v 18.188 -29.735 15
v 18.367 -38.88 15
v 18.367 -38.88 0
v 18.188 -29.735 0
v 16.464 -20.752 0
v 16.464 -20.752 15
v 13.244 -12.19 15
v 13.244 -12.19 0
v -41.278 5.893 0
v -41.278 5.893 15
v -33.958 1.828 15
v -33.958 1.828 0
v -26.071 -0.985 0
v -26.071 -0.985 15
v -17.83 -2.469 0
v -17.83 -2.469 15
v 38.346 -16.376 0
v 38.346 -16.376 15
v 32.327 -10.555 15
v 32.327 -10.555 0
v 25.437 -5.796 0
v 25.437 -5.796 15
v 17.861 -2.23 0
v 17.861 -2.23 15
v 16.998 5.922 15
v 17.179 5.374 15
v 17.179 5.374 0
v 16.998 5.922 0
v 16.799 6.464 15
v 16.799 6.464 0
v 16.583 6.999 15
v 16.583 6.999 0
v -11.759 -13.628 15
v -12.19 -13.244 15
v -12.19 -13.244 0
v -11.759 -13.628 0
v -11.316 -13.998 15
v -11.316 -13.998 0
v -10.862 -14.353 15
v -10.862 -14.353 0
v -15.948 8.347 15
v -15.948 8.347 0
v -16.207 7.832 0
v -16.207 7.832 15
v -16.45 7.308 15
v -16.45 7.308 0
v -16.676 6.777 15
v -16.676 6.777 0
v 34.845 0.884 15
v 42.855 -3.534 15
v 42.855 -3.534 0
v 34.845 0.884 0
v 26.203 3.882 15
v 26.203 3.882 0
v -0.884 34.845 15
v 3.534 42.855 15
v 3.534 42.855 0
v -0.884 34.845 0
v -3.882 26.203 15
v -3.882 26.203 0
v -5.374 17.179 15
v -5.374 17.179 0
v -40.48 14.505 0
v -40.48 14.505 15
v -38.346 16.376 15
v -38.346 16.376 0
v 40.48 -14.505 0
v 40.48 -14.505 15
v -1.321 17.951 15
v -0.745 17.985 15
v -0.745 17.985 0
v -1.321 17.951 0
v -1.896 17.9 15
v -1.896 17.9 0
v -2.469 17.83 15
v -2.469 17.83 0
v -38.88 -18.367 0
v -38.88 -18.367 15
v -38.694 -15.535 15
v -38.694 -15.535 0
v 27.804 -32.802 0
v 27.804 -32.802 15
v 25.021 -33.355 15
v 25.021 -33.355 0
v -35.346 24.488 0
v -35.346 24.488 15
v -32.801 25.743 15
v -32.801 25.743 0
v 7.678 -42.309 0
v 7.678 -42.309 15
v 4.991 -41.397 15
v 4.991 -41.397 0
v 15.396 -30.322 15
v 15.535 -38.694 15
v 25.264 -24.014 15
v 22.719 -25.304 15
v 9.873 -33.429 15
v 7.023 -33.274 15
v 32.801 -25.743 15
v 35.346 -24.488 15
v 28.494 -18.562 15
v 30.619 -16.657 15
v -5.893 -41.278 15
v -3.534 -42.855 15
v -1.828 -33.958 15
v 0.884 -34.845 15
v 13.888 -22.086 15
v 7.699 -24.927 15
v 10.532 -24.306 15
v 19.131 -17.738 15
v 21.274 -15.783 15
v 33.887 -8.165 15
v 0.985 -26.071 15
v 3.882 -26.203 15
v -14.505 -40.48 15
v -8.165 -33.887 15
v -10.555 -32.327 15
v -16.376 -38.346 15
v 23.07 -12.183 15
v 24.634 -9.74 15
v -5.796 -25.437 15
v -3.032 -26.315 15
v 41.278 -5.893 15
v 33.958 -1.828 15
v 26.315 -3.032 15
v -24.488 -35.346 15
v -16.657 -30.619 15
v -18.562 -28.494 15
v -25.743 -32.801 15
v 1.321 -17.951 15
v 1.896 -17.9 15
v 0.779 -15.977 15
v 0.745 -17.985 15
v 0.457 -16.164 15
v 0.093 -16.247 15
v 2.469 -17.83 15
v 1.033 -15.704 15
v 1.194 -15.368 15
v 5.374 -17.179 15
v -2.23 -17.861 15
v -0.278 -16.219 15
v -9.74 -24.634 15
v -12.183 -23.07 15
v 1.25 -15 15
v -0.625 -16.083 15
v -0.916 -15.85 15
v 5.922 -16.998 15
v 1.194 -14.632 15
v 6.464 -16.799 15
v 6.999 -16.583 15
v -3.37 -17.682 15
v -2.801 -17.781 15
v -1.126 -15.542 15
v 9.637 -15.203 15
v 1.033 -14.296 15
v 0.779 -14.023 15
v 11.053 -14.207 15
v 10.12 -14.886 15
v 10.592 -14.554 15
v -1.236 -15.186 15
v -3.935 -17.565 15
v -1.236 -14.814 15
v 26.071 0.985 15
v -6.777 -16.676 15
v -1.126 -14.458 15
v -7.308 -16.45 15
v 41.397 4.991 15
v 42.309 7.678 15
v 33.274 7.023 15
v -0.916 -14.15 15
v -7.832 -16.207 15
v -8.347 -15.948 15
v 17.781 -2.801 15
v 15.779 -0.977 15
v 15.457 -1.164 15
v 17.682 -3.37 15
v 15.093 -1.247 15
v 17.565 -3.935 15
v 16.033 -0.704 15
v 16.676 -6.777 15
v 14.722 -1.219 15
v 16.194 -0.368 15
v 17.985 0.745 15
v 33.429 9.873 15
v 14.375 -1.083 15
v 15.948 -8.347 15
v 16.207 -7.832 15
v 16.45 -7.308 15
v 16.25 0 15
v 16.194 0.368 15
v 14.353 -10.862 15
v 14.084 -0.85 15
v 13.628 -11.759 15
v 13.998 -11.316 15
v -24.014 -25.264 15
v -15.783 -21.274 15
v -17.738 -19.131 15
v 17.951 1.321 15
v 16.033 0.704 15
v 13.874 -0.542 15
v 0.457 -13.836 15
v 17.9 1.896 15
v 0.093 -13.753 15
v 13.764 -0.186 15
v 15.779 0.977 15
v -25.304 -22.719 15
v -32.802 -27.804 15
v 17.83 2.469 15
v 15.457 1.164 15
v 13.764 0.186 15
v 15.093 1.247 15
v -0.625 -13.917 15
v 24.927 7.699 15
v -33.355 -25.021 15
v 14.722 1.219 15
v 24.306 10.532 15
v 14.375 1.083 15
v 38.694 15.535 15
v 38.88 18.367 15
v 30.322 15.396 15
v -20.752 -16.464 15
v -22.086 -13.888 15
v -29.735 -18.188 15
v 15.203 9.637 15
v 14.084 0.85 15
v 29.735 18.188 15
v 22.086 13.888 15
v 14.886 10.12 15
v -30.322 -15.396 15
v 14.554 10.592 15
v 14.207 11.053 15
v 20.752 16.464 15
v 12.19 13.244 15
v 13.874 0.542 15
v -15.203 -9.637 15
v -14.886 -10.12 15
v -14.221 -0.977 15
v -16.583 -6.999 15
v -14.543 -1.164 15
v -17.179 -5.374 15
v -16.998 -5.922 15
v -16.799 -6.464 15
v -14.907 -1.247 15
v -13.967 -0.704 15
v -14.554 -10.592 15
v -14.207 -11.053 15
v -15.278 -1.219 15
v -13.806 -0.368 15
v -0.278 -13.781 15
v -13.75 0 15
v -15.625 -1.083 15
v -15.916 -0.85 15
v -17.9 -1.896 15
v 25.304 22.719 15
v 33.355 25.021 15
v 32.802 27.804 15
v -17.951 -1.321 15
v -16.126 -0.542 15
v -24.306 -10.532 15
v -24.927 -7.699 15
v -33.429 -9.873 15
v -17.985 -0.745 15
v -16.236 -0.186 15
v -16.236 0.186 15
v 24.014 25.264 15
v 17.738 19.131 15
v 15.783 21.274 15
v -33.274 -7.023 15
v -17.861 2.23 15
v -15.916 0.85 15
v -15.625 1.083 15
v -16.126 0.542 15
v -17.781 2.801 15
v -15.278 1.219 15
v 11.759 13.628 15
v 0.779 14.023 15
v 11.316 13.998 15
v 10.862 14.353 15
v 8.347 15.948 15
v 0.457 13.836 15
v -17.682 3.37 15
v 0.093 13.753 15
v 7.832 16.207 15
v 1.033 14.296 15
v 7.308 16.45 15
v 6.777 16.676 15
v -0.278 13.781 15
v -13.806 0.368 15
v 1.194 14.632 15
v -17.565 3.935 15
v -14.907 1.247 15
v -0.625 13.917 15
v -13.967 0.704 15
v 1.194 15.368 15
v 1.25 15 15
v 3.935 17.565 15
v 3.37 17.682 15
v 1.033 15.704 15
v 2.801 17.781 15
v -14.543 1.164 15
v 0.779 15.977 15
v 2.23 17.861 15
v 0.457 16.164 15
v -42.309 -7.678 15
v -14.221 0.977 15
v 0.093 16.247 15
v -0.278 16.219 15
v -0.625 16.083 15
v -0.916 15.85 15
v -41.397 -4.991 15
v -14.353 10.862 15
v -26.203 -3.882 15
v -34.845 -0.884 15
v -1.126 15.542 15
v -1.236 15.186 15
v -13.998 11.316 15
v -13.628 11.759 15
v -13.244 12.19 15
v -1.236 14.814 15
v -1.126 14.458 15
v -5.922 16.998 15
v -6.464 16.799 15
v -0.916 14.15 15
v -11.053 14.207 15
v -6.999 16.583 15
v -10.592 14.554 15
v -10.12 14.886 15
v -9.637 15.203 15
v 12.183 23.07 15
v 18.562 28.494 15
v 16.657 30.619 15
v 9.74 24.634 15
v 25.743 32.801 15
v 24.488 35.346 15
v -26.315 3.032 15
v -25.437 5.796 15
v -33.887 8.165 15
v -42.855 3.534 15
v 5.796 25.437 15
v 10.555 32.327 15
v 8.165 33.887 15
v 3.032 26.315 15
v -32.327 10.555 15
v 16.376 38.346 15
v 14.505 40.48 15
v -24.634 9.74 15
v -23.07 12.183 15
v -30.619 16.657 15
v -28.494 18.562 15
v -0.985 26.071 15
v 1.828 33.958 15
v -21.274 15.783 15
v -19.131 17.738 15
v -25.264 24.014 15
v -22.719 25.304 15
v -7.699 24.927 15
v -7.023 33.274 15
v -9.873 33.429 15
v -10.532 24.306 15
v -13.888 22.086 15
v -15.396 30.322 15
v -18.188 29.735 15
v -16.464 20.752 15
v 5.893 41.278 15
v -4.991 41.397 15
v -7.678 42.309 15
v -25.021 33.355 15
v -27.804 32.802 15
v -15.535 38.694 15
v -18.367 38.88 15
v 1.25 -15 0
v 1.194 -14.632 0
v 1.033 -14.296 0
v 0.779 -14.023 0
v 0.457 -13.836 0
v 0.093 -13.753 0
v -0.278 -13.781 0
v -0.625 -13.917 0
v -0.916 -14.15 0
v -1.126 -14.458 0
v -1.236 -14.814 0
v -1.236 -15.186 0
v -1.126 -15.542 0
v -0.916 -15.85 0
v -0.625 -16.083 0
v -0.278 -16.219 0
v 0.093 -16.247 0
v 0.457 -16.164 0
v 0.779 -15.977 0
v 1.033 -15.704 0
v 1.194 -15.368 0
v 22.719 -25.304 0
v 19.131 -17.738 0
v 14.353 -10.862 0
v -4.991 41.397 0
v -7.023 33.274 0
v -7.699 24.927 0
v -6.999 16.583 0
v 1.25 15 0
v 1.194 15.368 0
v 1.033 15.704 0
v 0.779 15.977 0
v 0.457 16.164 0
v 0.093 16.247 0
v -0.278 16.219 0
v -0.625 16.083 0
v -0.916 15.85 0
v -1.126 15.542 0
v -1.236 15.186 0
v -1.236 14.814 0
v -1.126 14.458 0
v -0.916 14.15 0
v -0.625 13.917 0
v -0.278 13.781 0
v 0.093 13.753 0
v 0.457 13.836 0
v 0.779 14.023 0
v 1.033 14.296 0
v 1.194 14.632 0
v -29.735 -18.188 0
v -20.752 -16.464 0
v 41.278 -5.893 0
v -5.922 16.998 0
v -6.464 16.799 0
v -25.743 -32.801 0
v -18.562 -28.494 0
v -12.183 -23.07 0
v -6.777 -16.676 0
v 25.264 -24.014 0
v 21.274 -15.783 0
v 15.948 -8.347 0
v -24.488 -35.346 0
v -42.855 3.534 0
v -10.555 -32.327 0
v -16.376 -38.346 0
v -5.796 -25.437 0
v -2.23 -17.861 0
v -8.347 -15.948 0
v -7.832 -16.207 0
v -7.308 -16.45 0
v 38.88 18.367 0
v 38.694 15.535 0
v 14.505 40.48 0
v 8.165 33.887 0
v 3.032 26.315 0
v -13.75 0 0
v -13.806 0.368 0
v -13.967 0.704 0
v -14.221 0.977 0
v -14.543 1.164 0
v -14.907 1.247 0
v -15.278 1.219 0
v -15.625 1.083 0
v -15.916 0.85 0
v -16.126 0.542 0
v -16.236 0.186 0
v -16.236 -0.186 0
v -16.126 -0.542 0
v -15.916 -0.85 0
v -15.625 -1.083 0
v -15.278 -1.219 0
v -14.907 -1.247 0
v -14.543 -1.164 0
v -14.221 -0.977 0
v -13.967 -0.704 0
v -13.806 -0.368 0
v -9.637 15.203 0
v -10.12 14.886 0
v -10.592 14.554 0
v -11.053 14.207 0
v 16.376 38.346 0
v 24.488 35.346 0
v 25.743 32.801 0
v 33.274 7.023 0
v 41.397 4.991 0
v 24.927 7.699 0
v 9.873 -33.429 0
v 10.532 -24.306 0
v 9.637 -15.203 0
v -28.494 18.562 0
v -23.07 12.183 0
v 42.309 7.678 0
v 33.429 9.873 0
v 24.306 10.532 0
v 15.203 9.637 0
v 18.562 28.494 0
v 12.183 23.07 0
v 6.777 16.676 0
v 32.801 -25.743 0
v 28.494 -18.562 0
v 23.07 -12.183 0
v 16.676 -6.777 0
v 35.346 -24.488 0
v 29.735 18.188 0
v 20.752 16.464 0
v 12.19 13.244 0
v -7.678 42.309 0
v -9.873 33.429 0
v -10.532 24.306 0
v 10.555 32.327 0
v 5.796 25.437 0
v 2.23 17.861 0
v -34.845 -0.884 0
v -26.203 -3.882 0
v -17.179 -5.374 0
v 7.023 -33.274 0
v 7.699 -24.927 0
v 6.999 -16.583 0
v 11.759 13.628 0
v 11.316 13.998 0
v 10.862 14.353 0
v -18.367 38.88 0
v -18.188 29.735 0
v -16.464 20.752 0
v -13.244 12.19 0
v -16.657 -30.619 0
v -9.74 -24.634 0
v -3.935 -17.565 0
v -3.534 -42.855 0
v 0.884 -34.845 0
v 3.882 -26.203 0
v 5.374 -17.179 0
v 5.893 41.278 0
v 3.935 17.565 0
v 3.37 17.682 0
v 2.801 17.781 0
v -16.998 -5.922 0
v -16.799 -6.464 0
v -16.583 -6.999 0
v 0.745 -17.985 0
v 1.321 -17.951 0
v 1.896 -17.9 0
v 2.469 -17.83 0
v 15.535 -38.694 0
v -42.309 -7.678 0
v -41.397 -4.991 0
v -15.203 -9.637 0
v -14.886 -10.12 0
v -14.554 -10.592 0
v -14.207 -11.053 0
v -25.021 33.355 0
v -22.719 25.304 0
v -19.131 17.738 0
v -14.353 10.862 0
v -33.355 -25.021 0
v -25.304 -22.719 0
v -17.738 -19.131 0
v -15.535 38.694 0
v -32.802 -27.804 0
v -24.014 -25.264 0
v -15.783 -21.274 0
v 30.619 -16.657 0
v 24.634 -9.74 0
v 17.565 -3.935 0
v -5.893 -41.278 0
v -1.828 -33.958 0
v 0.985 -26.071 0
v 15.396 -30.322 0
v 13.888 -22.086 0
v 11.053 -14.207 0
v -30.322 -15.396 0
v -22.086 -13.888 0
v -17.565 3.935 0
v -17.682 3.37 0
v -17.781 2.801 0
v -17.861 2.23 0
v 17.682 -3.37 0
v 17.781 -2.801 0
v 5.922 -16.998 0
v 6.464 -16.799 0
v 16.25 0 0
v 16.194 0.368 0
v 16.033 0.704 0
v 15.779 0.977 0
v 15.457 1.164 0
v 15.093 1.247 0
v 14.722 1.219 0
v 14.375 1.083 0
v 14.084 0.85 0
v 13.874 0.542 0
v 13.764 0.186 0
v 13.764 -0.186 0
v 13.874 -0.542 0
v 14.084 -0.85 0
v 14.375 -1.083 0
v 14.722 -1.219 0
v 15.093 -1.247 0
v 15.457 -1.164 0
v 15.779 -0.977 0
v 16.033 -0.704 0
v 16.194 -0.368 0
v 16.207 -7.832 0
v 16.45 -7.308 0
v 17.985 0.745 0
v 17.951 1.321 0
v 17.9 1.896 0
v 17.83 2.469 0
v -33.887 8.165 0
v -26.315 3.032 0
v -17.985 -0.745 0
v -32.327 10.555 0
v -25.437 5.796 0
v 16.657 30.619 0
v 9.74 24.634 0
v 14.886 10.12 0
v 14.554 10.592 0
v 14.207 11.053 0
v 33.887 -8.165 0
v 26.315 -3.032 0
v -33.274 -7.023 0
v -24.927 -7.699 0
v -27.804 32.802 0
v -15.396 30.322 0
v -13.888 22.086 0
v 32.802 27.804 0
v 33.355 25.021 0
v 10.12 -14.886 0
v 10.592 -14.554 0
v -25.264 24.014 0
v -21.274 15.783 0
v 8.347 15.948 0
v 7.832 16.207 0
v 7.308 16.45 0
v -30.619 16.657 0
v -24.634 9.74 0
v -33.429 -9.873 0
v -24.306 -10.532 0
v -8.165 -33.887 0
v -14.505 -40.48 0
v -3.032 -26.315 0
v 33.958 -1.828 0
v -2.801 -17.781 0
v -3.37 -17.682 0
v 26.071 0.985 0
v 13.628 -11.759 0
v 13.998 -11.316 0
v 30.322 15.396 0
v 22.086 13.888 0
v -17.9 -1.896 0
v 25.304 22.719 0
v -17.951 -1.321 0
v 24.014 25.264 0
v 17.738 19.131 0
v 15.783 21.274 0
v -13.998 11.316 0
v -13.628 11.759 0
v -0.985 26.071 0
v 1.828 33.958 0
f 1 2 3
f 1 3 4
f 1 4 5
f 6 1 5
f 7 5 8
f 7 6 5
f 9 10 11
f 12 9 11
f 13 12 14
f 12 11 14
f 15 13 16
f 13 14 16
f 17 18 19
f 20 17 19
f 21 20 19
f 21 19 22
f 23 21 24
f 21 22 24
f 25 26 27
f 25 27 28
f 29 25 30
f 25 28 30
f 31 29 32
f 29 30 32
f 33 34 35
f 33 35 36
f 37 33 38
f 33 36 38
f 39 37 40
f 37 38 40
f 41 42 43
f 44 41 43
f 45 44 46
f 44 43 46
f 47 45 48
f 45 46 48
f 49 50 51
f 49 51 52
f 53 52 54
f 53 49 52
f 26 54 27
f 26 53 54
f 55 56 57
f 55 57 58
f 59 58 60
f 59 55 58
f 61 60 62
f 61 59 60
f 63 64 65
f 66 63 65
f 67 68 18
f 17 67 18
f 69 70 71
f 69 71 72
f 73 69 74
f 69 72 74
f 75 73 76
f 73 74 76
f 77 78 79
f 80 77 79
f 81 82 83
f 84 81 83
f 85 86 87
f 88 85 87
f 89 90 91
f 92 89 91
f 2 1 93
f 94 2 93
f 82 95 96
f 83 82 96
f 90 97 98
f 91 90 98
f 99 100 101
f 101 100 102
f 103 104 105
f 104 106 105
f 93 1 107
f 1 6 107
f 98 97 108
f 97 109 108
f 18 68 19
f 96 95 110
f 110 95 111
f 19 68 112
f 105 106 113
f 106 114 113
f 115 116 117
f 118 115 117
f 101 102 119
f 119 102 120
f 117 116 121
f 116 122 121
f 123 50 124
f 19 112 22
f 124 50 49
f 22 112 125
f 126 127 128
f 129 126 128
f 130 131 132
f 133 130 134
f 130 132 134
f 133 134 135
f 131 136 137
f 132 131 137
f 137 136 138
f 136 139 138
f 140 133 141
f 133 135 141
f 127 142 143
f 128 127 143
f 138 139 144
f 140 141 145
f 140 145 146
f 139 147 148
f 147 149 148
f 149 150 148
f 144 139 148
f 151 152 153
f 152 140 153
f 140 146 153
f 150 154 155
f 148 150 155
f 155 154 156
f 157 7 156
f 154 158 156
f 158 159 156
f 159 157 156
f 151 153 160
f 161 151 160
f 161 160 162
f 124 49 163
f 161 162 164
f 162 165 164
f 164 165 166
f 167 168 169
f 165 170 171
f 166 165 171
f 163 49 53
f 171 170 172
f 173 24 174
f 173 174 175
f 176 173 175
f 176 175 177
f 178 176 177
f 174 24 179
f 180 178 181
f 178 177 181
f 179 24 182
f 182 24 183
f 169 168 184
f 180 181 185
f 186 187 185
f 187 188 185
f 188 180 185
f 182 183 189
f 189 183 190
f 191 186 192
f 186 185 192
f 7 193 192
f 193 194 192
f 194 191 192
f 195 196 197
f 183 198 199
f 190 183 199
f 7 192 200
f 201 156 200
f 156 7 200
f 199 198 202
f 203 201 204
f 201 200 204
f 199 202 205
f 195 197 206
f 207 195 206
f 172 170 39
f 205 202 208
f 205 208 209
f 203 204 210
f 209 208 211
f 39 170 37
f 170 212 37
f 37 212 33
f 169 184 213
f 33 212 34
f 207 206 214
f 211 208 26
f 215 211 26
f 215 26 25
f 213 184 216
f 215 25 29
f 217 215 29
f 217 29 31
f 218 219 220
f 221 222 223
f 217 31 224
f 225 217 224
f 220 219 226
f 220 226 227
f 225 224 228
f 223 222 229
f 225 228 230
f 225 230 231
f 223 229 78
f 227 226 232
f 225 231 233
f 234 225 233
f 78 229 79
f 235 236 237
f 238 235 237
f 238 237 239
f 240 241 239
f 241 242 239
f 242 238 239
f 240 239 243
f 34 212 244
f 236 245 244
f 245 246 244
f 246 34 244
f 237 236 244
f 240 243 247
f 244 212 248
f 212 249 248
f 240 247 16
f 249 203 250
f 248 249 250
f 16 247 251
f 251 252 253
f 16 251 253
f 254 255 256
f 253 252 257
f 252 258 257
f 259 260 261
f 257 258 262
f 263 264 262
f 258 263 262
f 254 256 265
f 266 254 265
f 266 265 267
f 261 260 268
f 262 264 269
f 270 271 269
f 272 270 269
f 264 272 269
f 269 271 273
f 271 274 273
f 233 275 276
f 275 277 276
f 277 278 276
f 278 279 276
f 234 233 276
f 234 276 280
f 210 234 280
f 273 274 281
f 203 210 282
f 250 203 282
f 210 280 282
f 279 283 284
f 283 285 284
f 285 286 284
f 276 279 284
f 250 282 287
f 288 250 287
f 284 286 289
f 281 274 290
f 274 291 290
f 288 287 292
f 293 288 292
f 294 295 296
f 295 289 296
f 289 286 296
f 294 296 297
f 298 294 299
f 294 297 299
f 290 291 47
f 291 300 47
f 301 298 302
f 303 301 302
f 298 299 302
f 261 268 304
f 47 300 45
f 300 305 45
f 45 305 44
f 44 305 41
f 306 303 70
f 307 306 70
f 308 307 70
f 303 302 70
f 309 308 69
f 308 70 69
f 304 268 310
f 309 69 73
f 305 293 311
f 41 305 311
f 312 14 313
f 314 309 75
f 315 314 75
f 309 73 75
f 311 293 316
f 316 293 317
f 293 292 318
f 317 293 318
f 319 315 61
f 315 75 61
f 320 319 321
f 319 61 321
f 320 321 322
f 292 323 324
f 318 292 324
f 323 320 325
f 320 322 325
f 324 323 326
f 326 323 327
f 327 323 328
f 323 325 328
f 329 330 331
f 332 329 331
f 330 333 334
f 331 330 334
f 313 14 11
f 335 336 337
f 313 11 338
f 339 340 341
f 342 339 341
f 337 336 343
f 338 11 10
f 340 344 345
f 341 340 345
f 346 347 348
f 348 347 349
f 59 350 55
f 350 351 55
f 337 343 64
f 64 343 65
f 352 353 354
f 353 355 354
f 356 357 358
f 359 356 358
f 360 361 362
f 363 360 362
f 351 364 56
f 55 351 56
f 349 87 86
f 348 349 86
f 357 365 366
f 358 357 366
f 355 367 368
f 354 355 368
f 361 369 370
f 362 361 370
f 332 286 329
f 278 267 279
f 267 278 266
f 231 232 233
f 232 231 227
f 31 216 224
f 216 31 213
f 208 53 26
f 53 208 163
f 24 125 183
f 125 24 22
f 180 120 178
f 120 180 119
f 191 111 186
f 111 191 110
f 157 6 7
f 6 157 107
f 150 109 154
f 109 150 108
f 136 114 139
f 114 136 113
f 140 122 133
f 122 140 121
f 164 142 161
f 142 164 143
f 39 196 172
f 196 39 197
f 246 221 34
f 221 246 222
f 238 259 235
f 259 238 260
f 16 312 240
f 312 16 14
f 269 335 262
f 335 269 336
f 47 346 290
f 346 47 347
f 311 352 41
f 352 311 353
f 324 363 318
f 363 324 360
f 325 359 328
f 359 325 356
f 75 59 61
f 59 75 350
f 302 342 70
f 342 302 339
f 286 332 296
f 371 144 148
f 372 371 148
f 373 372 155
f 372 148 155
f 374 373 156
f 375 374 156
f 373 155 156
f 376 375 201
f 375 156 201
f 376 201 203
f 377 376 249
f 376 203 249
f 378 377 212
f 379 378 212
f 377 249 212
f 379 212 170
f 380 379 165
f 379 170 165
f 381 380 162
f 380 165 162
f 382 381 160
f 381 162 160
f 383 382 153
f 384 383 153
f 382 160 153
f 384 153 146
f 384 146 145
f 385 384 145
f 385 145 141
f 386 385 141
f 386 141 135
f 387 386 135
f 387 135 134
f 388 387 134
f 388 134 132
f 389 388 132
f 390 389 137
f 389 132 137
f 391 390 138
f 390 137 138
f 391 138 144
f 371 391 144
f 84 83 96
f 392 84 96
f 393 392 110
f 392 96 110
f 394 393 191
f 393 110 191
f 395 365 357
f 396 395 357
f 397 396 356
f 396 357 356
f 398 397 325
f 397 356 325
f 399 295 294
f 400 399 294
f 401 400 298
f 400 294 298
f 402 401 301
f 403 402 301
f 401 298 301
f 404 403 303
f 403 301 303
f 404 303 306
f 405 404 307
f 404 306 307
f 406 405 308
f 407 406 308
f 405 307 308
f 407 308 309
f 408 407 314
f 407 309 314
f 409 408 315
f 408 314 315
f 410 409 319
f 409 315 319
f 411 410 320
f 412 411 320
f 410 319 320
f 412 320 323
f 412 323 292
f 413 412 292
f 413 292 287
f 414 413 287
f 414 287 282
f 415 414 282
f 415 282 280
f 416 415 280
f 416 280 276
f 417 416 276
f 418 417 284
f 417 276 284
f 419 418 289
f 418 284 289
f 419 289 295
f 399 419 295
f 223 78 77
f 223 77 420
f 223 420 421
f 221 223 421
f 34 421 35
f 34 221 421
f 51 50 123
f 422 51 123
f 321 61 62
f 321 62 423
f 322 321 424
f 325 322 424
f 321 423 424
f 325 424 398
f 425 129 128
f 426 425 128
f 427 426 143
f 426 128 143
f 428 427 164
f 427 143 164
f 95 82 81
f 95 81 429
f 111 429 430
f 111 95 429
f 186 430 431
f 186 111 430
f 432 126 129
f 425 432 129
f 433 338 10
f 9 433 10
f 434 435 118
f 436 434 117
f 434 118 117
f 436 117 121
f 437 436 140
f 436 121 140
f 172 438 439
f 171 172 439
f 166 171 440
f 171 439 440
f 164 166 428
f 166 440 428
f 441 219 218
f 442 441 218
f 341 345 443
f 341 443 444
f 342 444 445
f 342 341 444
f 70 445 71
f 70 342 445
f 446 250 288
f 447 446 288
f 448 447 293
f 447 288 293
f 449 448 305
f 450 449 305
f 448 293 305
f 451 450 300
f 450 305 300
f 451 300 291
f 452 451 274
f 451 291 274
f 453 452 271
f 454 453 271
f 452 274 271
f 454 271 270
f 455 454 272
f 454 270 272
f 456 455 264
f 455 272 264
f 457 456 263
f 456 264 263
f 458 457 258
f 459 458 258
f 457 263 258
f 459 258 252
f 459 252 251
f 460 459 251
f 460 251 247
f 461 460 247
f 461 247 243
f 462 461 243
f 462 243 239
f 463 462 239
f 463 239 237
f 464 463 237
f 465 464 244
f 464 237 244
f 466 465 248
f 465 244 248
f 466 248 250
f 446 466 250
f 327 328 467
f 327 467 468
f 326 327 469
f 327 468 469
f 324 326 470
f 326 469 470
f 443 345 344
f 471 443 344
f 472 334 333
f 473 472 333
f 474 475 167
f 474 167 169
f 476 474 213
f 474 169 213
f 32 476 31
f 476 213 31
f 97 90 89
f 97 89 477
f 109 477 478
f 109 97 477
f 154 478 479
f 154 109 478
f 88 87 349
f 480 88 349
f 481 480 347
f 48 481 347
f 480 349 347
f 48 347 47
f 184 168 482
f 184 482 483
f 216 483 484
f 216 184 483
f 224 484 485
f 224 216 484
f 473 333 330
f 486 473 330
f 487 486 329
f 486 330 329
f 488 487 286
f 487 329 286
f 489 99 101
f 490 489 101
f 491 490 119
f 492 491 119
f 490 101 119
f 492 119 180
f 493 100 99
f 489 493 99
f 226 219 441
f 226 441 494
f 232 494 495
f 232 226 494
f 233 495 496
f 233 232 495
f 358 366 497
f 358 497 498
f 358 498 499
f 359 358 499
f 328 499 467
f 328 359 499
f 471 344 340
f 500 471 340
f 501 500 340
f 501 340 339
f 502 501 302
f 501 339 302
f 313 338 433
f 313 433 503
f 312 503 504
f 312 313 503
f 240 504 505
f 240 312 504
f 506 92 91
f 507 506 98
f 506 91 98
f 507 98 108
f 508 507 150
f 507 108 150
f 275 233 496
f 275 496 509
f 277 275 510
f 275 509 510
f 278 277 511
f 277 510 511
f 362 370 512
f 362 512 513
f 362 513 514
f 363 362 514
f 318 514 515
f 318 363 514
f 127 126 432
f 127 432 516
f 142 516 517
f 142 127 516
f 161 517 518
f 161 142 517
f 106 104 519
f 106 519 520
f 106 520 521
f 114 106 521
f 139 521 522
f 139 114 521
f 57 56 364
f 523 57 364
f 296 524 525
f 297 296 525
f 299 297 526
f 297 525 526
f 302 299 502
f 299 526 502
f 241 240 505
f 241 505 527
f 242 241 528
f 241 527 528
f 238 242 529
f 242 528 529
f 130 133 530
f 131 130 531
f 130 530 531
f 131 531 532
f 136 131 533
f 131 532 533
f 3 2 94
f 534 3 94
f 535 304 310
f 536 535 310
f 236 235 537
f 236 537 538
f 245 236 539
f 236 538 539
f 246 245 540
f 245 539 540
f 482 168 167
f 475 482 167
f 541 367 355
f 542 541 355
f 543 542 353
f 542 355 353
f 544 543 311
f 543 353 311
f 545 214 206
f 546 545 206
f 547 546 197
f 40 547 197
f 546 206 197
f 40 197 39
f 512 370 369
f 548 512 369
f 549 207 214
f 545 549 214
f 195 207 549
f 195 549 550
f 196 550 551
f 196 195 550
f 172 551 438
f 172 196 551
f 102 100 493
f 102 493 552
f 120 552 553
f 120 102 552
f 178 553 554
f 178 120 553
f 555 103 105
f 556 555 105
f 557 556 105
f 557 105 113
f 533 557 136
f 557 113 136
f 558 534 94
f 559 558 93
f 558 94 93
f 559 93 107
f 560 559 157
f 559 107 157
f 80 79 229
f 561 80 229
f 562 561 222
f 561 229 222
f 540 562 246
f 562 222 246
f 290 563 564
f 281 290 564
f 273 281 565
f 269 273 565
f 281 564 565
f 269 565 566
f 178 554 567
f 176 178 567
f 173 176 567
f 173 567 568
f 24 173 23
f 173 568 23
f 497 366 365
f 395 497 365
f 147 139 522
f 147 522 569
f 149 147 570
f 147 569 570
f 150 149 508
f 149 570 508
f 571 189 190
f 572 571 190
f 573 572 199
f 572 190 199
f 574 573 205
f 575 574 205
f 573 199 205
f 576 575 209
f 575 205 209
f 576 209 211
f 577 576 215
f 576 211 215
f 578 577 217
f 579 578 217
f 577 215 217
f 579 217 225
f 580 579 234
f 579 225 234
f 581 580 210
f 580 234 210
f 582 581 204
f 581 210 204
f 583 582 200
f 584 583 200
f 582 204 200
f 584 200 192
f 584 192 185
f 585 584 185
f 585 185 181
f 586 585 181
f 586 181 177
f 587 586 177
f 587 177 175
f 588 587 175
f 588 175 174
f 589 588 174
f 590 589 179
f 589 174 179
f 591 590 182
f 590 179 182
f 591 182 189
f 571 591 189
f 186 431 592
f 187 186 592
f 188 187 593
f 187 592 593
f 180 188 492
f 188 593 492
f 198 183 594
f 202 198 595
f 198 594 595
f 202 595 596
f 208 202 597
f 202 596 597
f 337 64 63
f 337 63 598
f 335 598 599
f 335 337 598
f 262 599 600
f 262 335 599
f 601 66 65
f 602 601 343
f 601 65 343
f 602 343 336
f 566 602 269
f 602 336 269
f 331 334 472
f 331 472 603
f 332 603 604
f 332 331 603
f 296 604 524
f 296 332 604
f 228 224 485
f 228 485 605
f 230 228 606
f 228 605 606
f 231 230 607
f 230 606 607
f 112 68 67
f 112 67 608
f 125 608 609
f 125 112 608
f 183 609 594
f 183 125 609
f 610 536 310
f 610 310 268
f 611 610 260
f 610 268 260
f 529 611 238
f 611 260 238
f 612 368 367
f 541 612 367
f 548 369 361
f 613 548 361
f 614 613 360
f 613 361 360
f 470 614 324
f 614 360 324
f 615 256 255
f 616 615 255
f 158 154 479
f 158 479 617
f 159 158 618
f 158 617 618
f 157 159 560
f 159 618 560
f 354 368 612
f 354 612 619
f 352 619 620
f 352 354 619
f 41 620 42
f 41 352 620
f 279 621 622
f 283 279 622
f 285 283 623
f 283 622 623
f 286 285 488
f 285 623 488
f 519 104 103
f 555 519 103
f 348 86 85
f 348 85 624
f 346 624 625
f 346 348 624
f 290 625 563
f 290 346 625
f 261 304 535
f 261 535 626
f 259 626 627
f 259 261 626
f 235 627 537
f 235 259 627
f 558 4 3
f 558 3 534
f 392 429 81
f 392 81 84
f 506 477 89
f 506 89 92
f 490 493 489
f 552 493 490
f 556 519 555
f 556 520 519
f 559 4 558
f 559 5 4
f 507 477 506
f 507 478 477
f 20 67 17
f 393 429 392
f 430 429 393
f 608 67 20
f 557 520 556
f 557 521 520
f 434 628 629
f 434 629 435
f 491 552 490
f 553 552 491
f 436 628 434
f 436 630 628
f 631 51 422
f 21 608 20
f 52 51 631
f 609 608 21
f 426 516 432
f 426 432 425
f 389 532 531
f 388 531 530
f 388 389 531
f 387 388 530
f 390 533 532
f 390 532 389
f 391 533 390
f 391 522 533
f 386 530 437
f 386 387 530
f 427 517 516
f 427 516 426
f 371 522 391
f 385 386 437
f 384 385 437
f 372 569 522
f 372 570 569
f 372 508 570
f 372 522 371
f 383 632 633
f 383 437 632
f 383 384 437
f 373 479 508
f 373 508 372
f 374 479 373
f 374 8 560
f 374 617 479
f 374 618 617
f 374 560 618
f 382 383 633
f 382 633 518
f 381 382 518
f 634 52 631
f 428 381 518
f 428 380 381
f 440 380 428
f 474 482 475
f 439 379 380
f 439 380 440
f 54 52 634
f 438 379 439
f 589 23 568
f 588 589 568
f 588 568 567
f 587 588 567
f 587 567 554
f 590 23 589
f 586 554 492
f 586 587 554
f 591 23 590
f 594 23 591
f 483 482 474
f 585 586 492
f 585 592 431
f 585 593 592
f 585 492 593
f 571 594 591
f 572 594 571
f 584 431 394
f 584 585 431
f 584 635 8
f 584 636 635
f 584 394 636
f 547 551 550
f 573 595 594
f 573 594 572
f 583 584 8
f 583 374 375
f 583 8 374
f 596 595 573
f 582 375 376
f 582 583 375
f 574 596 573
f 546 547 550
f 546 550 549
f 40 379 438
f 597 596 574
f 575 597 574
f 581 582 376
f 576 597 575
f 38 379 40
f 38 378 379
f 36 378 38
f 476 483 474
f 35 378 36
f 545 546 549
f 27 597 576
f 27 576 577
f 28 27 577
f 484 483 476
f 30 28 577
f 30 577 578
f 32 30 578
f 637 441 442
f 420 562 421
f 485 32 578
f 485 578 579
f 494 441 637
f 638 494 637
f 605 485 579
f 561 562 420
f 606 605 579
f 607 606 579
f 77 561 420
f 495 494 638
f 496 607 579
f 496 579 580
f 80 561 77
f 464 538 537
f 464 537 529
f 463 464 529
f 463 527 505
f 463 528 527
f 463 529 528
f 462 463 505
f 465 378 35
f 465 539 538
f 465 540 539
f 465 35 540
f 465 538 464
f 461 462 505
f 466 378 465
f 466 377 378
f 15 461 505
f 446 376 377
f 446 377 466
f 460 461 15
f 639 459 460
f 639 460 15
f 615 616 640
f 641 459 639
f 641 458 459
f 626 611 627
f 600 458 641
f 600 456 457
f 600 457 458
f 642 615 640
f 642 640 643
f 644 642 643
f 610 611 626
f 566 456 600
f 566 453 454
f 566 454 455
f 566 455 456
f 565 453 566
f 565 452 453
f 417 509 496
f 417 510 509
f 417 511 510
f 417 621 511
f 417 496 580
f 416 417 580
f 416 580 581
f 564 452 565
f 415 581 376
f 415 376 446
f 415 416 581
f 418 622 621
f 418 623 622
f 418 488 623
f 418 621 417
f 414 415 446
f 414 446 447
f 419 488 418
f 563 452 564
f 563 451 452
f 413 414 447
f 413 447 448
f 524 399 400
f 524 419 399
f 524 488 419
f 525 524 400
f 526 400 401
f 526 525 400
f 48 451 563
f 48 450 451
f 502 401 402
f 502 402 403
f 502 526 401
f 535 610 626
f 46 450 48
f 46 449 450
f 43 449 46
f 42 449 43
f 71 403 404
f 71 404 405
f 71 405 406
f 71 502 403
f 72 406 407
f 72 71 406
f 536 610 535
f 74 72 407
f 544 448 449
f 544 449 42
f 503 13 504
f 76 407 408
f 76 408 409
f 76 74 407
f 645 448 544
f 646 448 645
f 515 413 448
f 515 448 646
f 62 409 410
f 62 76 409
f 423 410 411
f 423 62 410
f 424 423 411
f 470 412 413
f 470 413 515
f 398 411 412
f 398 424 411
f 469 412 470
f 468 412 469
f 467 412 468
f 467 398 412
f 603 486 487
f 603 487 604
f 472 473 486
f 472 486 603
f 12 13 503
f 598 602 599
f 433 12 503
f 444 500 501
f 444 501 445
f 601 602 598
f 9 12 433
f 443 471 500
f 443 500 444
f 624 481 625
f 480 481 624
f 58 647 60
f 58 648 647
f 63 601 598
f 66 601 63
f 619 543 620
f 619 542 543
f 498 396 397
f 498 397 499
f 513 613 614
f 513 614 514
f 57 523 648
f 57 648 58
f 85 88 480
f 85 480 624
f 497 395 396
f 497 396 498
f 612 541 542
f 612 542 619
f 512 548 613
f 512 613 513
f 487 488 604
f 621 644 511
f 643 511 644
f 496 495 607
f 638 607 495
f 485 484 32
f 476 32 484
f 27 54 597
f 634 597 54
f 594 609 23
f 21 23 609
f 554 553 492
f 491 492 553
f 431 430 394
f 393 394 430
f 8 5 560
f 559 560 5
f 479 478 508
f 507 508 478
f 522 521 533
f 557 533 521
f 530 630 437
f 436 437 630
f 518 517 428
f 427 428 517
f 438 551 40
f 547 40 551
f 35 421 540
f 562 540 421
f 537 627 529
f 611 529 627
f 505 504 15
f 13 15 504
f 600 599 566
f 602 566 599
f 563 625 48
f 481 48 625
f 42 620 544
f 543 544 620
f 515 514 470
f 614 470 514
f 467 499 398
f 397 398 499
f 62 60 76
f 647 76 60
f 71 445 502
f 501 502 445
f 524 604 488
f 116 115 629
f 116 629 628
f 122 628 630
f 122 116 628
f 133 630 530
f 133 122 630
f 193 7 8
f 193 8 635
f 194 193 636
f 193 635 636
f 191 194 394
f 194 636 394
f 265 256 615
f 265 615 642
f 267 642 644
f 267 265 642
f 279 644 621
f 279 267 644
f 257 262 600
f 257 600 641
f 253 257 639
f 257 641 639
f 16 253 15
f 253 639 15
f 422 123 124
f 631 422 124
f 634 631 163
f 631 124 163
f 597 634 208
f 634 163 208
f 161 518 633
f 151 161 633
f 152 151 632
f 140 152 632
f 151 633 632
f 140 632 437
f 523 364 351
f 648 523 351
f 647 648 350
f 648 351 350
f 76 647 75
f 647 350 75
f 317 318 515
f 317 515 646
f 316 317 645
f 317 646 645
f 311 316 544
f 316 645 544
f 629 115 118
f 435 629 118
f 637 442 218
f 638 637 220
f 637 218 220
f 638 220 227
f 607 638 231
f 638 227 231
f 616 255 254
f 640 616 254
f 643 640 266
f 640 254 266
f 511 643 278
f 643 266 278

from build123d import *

# Parameters (mm, degrees)
COPYSKETCH001_R    = 18
PAD_DEPTH          = 15
PAD001_DEPTH       = 15
POLARPATTERN_COUNT = 24
SKETCH_R           = 1.25
POCKET_DEPTH       = 15


with BuildPart() as part:
    # CopySketch001 → Pad (new body)
    with BuildSketch(Plane.XY):
        Circle(COPYSKETCH001_R)
    extrude(amount=PAD_DEPTH)

    # Sketch001 (on Face3 of Pad) → Pad001 (join)
    with BuildSketch(Plane.XY.offset(15)):
        with BuildLine():
            ThreePointArc((16.375899, 38.346054), (7.775164, 28.601805), (1.916739, 17))
            Line((-1.083261, 17), (1.916739, 17))
            ThreePointArc((14.505004, 40.479684), (5.147213, 29.777962), (-1.083261, 17))
            Line((14.505004, 40.479684), (16.375899, 38.346054))
        make_face()
    pad001 = extrude(amount=-PAD001_DEPTH)

    # PolarPattern: Pad001 ×24 about axis
    polarpattern_axis = Axis((0, 0, 0), (0, 0, 1))
    for i in range(1, POLARPATTERN_COUNT):
        add(pad001.rotate(polarpattern_axis, i * 360 / POLARPATTERN_COUNT))

    # Sketch (on Face57 of PolarPattern) → Pocket (cut)
    with BuildSketch(Plane.XY.offset(15)):
        with Locations((0, 15)):
            Circle(SKETCH_R)
        with Locations((-15, 0)):
            Circle(SKETCH_R)
        with Locations((0, -15)):
            Circle(SKETCH_R)
        with Locations((15, 0)):
            Circle(SKETCH_R)
    extrude(amount=-POCKET_DEPTH, mode=Mode.SUBTRACT)


solid = part.part
